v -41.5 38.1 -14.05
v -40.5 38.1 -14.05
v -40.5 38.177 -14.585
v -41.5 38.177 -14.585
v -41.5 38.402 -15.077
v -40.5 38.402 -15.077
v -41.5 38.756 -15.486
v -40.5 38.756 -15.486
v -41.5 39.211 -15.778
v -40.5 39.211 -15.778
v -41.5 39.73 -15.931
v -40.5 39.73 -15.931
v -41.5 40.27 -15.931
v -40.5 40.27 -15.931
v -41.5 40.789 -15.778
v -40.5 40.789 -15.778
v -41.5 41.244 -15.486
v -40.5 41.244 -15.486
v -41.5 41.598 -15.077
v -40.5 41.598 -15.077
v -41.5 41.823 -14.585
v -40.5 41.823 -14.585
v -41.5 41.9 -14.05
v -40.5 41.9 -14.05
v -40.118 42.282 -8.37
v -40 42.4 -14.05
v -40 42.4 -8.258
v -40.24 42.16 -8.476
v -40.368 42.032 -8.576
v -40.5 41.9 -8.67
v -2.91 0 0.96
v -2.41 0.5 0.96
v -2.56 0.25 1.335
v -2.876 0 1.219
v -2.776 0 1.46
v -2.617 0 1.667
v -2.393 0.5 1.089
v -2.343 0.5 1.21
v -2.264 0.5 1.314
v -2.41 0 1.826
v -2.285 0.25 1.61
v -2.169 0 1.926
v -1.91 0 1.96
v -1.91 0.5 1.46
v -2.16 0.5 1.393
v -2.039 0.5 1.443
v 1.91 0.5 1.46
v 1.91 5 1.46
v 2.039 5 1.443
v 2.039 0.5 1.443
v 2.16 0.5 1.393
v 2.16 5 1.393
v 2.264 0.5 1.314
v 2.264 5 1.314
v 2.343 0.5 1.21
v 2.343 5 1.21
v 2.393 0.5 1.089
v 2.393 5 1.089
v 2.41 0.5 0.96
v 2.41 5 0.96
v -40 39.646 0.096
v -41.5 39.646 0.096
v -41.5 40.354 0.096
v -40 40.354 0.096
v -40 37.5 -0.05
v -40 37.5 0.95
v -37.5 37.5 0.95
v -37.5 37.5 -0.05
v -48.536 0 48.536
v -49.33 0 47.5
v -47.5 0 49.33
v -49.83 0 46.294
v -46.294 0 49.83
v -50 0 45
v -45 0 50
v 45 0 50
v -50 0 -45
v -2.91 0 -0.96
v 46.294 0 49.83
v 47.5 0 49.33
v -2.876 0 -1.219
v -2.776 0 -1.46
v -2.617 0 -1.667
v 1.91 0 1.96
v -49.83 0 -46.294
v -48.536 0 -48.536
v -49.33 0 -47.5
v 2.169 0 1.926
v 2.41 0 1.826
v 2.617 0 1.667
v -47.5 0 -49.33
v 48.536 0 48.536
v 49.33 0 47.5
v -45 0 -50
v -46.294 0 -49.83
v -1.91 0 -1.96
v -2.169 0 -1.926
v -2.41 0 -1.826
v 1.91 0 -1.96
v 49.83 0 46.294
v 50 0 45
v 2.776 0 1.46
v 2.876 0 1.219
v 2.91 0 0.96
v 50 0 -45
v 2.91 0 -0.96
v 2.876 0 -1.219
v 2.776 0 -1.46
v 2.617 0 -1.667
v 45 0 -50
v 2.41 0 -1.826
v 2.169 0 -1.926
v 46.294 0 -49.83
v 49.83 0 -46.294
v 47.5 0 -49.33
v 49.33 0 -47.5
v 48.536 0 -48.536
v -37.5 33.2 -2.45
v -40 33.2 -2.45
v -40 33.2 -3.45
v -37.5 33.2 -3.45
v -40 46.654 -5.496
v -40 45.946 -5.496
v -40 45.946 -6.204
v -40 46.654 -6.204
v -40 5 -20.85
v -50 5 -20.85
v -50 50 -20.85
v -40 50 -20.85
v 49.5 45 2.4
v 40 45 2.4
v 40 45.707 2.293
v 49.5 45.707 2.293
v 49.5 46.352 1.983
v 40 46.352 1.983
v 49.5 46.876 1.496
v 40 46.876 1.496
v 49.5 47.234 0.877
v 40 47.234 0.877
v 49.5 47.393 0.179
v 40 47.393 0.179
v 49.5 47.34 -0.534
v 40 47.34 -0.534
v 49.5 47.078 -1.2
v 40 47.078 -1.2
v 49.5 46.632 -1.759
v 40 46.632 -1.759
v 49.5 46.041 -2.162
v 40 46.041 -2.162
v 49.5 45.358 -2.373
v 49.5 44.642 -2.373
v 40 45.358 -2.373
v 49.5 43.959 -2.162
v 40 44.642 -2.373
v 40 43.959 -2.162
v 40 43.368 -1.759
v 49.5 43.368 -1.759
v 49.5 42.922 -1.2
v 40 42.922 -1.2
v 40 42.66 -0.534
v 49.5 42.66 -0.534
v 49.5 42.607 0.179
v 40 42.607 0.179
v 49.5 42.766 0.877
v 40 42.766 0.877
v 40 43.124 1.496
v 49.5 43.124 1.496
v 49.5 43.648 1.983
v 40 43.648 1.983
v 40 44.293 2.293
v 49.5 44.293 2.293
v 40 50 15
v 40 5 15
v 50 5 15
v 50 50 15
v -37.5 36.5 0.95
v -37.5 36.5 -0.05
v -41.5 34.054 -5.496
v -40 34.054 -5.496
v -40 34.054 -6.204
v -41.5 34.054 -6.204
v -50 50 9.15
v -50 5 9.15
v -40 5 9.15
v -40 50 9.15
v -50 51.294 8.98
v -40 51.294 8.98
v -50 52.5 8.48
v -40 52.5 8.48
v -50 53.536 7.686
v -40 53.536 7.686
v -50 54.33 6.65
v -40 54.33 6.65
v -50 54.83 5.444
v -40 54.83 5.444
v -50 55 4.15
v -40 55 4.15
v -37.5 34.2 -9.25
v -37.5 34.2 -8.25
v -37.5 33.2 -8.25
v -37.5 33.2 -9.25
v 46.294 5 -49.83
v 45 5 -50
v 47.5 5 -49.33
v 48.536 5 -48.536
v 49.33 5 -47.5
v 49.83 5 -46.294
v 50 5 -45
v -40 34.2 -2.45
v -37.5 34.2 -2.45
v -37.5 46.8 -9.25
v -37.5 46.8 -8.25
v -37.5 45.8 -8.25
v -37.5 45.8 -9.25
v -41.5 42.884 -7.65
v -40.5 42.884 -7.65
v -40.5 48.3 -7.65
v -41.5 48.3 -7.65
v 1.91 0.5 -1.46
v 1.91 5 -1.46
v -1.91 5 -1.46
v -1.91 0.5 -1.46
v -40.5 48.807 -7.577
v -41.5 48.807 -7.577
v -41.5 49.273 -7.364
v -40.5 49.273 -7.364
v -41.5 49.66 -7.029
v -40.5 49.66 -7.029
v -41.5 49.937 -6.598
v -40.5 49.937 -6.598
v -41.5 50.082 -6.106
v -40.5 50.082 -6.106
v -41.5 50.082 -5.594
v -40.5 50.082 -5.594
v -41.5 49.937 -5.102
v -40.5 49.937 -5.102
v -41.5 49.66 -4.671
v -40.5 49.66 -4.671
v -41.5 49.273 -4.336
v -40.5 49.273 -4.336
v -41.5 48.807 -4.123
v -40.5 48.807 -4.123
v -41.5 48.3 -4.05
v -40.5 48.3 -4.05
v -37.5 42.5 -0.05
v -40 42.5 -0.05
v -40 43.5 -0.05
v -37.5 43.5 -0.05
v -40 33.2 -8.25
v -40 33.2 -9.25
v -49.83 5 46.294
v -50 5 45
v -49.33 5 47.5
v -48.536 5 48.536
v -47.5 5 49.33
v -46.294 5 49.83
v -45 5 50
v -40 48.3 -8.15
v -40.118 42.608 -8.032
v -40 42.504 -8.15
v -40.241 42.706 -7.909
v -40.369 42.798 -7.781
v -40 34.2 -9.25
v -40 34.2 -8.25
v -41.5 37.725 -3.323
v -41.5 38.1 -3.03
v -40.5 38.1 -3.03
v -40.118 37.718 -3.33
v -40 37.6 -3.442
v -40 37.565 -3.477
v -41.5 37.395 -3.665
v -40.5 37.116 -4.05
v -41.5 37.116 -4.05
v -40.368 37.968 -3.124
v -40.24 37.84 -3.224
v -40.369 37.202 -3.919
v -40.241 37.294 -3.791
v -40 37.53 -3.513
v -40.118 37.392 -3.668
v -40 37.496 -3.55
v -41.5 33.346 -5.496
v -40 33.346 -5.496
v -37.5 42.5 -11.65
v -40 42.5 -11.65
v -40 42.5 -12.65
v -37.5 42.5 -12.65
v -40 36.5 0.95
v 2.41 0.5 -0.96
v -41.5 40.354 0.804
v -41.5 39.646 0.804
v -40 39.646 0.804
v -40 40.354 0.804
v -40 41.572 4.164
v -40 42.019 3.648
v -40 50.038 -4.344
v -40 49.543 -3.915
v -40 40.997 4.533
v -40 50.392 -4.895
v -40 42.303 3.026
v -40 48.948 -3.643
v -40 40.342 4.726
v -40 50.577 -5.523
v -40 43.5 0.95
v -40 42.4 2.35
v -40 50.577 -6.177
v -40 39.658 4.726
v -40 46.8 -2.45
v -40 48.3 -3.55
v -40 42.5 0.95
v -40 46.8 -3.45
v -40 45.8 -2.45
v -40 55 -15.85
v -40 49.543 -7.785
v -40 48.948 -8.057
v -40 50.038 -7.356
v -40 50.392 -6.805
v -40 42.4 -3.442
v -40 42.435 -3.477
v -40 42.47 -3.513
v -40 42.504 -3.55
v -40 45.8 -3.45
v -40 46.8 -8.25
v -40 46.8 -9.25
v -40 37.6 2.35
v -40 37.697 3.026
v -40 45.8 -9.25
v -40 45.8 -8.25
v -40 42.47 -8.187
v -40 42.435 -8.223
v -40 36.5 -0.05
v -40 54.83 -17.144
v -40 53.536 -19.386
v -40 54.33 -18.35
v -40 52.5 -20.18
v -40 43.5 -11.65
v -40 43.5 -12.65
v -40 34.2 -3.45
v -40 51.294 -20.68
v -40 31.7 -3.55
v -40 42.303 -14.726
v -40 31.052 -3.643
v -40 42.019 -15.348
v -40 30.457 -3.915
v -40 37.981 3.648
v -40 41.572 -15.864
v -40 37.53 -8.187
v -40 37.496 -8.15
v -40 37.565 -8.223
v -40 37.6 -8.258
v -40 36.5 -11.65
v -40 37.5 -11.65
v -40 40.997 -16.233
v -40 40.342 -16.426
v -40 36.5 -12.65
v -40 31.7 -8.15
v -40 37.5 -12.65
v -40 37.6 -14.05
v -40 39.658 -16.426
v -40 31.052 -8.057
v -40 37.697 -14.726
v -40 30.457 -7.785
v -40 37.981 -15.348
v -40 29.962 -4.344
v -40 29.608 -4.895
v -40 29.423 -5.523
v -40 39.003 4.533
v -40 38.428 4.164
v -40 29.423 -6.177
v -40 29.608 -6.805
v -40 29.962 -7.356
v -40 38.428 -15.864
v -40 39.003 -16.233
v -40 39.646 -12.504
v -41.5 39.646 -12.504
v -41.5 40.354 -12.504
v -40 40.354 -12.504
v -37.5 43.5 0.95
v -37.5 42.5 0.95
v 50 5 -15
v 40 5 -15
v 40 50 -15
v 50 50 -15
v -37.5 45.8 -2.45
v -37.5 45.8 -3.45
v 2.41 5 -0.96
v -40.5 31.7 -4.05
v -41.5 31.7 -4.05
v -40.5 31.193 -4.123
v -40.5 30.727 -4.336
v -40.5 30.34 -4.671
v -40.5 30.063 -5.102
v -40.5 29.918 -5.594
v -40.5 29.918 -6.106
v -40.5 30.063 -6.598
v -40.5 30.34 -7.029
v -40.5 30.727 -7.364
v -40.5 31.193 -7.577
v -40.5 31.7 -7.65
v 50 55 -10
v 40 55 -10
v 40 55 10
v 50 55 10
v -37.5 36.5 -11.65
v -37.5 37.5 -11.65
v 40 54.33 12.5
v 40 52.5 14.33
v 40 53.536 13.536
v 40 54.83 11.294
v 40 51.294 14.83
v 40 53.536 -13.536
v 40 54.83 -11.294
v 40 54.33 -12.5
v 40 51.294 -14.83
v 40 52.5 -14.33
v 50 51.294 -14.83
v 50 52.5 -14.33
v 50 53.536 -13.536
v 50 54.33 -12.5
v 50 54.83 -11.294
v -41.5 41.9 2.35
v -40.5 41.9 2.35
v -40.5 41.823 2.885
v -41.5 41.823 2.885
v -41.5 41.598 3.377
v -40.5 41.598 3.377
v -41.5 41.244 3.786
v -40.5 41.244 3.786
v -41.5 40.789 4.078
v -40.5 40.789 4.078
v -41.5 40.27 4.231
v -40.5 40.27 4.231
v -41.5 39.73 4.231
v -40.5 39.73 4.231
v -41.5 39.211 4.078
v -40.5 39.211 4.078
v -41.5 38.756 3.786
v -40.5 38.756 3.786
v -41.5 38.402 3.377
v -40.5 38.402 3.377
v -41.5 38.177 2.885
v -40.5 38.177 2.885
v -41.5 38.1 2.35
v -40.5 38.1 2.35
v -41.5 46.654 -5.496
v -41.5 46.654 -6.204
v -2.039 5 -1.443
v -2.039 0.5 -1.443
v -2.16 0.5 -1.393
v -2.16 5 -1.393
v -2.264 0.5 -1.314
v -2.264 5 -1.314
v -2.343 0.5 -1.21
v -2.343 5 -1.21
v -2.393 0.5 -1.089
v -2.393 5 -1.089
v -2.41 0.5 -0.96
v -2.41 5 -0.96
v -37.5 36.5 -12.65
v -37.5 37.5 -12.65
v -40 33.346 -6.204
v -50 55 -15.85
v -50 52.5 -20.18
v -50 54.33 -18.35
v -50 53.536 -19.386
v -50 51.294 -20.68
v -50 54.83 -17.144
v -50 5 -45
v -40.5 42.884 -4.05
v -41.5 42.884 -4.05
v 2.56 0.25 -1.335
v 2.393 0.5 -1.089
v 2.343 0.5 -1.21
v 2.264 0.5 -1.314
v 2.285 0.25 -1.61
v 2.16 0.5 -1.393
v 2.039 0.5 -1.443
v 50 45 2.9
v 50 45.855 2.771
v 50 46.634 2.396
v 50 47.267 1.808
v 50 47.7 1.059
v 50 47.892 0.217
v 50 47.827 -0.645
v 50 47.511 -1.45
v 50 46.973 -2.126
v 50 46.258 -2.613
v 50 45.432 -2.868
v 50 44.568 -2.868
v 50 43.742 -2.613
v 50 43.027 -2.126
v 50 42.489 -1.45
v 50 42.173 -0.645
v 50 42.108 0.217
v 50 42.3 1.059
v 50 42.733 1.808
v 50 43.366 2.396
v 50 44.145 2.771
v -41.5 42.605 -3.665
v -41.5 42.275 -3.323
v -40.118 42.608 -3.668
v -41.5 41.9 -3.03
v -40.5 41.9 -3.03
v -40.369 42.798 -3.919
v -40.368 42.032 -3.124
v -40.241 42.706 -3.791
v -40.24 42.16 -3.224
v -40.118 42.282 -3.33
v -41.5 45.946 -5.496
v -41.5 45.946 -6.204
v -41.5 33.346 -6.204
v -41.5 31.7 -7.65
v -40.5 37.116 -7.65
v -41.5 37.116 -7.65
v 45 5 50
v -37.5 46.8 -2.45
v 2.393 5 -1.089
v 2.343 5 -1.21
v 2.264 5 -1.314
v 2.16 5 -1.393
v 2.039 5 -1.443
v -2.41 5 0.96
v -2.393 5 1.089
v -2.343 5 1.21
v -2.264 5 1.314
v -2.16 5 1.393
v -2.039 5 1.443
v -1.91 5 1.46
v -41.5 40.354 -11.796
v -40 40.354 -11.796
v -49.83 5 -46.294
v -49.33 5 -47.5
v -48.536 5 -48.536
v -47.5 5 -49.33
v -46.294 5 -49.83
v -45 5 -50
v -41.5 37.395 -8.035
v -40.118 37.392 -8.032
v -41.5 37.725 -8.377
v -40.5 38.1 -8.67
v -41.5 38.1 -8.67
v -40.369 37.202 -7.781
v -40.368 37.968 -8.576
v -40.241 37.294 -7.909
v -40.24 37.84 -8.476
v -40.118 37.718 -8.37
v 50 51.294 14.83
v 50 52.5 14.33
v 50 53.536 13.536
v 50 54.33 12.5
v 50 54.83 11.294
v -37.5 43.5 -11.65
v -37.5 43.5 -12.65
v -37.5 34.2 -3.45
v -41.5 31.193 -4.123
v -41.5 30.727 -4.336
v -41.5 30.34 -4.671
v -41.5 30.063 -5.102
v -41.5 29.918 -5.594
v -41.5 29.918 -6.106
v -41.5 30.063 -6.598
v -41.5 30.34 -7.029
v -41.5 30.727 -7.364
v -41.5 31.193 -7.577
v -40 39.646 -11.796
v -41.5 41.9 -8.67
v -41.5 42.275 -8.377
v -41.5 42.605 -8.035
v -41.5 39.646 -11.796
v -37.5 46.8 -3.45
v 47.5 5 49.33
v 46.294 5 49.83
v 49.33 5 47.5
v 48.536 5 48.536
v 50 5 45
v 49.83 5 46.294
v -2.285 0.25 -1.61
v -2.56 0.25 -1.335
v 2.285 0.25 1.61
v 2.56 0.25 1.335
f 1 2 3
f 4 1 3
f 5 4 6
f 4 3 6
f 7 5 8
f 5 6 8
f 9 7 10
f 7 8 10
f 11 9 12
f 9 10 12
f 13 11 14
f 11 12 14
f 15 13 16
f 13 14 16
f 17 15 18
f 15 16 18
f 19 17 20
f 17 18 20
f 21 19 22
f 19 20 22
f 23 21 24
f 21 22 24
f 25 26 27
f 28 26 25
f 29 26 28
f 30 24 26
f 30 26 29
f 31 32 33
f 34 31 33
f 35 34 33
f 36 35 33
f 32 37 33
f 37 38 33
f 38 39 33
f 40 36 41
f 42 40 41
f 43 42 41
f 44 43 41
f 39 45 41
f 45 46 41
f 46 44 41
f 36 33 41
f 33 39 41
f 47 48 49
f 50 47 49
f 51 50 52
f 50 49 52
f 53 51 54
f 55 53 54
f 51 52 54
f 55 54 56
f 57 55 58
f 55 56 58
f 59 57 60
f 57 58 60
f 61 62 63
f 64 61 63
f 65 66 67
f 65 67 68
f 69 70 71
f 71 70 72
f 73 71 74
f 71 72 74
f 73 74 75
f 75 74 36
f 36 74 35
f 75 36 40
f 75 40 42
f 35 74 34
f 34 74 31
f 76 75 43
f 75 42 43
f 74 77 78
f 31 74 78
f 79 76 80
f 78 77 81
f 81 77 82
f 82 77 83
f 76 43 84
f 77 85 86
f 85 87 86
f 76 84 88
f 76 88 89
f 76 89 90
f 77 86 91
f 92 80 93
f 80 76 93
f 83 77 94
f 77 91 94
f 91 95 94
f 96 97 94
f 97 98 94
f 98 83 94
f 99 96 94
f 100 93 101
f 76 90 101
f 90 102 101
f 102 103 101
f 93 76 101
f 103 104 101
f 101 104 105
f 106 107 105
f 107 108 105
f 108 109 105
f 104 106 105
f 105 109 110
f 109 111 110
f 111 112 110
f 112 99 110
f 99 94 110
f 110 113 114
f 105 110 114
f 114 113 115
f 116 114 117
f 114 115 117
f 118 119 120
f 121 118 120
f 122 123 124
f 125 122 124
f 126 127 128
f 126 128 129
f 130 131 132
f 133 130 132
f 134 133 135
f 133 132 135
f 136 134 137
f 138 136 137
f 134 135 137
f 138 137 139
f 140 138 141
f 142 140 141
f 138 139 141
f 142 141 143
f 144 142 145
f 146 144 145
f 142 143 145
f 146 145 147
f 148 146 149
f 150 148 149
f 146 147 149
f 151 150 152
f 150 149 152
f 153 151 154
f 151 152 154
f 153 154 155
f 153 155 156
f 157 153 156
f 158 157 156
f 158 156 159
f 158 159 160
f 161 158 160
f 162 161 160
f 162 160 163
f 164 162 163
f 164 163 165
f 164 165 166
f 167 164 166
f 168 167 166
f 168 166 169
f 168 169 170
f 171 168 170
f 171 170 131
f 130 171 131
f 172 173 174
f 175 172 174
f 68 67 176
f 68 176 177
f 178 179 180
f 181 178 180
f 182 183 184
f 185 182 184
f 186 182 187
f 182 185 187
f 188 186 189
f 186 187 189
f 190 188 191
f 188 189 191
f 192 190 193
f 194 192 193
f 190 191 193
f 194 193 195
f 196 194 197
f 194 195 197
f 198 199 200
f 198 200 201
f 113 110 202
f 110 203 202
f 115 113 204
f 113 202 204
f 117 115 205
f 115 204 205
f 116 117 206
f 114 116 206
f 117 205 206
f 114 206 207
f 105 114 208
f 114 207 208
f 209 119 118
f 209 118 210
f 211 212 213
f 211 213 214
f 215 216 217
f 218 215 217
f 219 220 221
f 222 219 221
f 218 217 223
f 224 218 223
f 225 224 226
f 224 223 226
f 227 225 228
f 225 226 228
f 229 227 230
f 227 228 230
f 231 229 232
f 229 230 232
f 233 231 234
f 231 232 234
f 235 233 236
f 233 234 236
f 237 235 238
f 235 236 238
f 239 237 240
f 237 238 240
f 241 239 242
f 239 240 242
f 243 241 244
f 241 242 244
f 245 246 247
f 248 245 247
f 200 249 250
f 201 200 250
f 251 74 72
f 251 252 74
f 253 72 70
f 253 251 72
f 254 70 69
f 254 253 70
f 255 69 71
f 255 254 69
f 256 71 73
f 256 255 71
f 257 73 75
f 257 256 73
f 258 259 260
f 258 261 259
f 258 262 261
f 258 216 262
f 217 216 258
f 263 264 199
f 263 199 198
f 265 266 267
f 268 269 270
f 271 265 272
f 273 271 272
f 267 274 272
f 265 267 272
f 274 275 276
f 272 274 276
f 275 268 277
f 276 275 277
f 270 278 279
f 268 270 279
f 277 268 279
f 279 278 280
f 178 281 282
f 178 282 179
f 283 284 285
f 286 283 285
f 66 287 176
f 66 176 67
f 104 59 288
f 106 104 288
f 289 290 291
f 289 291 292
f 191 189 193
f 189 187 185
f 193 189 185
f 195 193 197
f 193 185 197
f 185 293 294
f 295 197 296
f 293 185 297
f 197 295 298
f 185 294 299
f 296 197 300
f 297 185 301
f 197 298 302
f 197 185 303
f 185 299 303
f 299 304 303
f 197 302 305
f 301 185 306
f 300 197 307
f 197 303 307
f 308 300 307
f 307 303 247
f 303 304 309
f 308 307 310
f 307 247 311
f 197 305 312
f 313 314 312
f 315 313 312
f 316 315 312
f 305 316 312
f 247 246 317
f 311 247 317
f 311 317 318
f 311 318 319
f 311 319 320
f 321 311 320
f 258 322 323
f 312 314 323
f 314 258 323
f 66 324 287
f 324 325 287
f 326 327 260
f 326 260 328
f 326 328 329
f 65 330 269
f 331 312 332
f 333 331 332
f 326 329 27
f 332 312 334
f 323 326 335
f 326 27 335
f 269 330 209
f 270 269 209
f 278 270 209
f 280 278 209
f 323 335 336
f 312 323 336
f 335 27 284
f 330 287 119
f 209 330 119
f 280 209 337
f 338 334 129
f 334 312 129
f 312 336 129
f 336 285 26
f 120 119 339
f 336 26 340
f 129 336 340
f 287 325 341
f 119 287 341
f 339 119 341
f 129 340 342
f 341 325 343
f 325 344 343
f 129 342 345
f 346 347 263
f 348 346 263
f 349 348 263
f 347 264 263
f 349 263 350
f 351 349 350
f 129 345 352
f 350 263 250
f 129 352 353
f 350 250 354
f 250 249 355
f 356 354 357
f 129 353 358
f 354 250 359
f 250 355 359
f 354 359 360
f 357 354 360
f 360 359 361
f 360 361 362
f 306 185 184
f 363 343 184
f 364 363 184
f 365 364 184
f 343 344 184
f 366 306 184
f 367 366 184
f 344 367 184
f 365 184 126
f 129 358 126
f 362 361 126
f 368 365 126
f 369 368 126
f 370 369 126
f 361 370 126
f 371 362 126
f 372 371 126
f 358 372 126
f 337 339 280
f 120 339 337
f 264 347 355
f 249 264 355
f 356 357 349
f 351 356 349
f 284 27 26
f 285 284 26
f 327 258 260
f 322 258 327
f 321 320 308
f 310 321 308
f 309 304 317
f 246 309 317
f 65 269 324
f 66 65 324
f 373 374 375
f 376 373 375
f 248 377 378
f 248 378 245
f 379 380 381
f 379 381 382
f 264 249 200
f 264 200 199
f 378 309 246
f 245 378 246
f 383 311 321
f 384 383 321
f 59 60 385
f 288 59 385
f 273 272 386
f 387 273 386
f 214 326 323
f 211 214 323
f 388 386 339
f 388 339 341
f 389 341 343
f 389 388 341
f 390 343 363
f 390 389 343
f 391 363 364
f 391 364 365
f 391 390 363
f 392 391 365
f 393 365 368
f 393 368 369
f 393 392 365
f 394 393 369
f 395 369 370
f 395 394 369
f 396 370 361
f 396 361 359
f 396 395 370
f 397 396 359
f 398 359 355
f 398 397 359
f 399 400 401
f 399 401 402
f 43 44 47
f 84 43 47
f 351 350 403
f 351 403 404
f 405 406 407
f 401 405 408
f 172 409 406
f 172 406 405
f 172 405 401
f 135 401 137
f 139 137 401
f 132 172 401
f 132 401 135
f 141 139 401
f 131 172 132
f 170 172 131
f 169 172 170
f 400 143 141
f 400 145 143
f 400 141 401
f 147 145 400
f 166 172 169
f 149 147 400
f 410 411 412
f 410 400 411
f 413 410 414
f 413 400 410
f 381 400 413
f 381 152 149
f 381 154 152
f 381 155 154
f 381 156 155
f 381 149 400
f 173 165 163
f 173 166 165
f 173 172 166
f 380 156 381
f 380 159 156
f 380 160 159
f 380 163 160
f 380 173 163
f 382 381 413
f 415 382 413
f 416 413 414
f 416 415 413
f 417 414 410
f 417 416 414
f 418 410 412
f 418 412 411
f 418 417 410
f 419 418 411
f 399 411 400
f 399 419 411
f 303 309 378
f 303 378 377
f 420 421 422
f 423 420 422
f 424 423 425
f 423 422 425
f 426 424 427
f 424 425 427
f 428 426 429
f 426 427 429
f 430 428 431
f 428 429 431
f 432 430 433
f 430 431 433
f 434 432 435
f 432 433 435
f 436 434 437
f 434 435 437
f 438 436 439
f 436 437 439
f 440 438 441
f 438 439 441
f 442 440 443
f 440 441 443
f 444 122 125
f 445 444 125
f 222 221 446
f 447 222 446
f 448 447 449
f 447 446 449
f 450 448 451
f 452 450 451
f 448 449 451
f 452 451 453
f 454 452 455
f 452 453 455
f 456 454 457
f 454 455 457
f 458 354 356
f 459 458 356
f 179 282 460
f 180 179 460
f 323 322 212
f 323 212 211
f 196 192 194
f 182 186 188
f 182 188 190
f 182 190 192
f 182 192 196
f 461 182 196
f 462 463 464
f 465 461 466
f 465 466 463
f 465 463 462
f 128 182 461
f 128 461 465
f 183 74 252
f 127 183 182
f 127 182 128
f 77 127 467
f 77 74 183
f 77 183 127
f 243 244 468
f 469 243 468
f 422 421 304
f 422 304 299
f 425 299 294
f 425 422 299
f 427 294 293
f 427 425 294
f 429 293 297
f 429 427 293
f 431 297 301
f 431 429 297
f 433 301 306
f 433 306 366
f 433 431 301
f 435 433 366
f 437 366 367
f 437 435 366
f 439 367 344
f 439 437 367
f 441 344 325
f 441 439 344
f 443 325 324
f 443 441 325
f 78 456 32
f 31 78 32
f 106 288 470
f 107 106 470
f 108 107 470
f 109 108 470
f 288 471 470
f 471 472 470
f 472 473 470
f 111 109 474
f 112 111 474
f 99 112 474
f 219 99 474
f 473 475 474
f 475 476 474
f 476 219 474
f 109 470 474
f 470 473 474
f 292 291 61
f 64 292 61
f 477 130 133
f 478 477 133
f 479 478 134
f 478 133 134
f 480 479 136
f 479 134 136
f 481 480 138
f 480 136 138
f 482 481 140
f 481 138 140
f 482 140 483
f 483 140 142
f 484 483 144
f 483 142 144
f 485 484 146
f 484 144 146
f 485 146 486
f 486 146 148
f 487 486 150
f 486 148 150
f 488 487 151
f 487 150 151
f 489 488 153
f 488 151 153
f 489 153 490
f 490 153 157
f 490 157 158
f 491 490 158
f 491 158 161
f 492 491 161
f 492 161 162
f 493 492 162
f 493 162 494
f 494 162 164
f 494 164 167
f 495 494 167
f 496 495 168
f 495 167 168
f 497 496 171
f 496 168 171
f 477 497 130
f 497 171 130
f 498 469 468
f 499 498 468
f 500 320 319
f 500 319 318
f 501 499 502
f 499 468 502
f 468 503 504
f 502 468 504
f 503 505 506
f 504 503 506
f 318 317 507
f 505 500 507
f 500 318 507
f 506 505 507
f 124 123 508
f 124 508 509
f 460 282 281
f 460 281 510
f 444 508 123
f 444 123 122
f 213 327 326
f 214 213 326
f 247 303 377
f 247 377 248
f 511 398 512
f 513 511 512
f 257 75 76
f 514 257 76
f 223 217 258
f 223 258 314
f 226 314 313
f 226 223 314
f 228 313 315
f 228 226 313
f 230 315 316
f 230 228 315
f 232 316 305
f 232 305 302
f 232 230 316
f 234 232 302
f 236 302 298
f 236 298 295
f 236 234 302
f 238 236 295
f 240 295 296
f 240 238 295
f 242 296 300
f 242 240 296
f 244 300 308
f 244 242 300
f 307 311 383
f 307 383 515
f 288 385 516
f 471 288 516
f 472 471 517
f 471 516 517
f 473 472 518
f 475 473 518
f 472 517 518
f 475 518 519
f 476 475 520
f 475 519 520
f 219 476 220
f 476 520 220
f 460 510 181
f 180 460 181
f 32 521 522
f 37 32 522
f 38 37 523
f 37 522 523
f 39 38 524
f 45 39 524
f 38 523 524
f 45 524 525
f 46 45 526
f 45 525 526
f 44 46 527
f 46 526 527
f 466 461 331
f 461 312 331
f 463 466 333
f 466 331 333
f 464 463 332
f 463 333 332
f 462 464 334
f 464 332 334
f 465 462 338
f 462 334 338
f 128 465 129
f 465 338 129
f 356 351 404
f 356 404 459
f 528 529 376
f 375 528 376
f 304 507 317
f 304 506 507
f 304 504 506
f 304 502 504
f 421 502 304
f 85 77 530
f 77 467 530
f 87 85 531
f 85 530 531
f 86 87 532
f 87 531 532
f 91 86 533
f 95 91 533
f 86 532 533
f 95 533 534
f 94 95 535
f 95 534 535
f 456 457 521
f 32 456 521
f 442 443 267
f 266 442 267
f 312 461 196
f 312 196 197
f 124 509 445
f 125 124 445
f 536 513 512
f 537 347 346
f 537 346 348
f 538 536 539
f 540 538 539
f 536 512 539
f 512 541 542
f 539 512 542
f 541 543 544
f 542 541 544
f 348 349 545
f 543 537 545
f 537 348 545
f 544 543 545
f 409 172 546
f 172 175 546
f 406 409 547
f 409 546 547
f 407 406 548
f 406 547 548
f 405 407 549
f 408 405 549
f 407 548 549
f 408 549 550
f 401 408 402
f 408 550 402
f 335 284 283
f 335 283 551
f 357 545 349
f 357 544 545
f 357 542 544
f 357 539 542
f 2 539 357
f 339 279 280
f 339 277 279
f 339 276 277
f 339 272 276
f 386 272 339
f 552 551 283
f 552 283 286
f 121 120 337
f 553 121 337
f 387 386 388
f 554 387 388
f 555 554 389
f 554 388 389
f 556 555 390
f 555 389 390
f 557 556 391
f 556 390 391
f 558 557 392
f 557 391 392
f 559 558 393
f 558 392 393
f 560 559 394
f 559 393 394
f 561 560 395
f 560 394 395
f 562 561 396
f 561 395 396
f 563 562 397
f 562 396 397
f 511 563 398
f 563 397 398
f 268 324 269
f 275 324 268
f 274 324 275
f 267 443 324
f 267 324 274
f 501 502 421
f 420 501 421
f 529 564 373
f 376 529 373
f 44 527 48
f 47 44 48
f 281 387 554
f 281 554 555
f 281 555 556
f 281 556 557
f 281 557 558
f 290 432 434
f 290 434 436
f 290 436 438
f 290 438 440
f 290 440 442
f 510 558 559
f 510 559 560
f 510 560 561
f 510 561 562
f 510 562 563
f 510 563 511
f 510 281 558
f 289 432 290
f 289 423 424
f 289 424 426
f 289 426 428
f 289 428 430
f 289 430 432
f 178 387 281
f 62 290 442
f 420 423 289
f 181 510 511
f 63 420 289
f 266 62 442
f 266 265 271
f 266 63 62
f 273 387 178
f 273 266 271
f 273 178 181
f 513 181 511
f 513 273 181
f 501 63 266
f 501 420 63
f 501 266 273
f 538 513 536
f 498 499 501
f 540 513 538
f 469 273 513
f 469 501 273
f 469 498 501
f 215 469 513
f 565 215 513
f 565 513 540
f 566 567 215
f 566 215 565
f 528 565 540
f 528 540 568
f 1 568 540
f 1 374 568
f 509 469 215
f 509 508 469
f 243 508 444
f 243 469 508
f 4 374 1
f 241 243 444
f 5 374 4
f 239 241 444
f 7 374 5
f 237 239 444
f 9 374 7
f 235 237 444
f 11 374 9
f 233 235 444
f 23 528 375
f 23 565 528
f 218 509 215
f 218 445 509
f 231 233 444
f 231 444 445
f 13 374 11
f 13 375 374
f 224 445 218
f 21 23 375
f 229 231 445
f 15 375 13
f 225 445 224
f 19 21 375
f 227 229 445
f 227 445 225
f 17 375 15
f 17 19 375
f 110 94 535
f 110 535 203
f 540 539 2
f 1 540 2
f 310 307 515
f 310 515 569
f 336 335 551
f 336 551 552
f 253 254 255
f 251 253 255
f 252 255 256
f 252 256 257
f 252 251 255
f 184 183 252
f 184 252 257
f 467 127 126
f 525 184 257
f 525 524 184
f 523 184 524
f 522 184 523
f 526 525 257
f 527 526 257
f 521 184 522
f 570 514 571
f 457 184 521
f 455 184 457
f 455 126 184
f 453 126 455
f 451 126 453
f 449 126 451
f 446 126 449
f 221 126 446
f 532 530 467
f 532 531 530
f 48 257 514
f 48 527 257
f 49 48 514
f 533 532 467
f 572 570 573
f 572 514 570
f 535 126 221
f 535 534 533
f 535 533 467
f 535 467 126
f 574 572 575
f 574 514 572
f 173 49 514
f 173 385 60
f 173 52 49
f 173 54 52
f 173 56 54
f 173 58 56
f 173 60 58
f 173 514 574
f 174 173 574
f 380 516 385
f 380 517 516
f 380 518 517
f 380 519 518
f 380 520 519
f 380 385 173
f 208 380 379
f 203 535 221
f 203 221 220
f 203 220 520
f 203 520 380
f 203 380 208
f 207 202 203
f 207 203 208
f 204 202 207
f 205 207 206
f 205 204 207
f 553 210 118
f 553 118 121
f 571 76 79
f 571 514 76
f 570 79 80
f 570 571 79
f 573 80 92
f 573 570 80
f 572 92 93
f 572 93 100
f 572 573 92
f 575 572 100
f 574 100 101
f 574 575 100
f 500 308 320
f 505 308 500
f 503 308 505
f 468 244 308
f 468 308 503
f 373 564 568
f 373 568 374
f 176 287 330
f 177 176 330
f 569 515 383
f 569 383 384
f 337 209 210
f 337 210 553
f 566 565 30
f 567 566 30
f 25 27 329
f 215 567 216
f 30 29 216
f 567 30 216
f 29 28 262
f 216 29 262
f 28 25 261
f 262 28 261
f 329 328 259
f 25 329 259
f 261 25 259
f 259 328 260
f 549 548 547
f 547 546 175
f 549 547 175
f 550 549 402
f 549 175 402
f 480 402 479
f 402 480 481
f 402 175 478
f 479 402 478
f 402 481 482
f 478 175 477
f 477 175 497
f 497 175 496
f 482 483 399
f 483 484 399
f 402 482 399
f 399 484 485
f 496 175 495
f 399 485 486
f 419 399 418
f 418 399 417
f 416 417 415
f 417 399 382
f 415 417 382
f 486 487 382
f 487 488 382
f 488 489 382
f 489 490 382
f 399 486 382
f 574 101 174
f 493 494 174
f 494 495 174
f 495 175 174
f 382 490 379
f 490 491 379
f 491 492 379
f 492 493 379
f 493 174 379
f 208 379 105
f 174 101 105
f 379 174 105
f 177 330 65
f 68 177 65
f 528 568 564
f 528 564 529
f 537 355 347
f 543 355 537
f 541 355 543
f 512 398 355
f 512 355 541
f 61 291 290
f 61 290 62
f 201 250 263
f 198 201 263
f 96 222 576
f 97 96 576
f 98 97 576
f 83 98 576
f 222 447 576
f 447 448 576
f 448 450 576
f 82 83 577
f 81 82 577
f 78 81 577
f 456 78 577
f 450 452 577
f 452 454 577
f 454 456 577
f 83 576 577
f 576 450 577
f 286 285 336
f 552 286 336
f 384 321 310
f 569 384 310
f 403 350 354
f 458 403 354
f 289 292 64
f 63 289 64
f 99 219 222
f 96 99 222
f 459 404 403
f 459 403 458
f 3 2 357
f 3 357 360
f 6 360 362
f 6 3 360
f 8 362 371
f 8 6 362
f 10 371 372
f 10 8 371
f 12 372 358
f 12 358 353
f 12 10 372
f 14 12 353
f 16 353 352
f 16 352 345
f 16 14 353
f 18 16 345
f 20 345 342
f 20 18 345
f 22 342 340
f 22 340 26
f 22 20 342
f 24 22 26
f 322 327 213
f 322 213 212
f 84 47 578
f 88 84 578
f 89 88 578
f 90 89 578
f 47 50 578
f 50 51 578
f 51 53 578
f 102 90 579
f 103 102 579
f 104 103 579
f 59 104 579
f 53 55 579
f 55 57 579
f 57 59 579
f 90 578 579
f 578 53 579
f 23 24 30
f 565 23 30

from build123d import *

# Parameters (mm, degrees)
SKETCH1_W           = 100
SKETCH1_H           = 100
BOSS_EXTRUDE1_DEPTH = 5
SKETCH2_W           = 10
SKETCH2_H           = 30
BOSS_EXTRUDE2_DEPTH = 50
CUT_EXTRUDE2_DEPTH  = 6
FILLET1_R           = 5
FILLET2_R           = 5
SKETCH7_W           = 0.707106782
SKETCH7_H           = 0.707106782
CUT_EXTRUDE3_DEPTH  = 1.5
SKETCH10_R          = 2.4
CUT_EXTRUDE4_DEPTH  = 11
CHAMFER1_SIZE       = 0.5
CHAMFER2_SIZE       = 0.5
CHAMFER3_SIZE       = 0.5
SKETCH11_W          = 1
SKETCH11_H          = 1
BOSS_EXTRUDE3_DEPTH = 2.5


with BuildPart() as part:
    # Sketch1 → Boss-Extrude1 (new body)
    with BuildSketch(Plane(origin=(0, 0, 0), x_dir=(1, 0, 0), z_dir=(0, 1, 0))):
        Rectangle(SKETCH1_W, SKETCH1_H)
    extrude(amount=BOSS_EXTRUDE1_DEPTH)

    # Sketch2 → Boss-Extrude2 (add)
    with BuildSketch(Plane(origin=(0, 5, 0), x_dir=(1, 0, 0), z_dir=(0, 1, 0))):
        with Locations((-45, 5.85)):
            Rectangle(SKETCH2_W, SKETCH2_H)
        with Locations((45, 0)):
            Rectangle(SKETCH2_W, SKETCH2_H)
    extrude(amount=BOSS_EXTRUDE2_DEPTH)

    # Sketch4 → Cut-Extrude2 (cut, through all)
    with BuildSketch(Plane(origin=(0, 5, 0), x_dir=(1, 0, 0), z_dir=(0, 1, 0))):
        with BuildLine():
            Line((-1.91, -1.46), (1.91, -1.46))
            ThreePointArc((1.91, -1.46), (2.263553391, -1.313553391), (2.41, -0.96))
            Line((2.41, -0.96), (2.41, 0.96))
            ThreePointArc((2.41, 0.96), (2.263553391, 1.313553391), (1.91, 1.46))
            Line((1.91, 1.46), (-1.91, 1.46))
            ThreePointArc((-1.91, 1.46), (-2.263553391, 1.313553391), (-2.41, 0.96))
            Line((-2.41, 0.96), (-2.41, -0.96))
            ThreePointArc((-2.41, -0.96), (-2.263553391, -1.313553391), (-1.91, -1.46))
        make_face()
    extrude(amount=-CUT_EXTRUDE2_DEPTH, mode=Mode.SUBTRACT)

    # Fillet1
    fillet1_edges = [part.edges().sort_by_distance(p)[0] for p in [
        (50, 2.5, 50),
        (-50, 2.5, 50),
        (-50, 2.5, -50),
        (50, 2.5, -50),
    ]]
    fillet(fillet1_edges, radius=FILLET1_R)

    # Fillet2
    fillet2_edges = [part.edges().sort_by_distance(p)[0] for p in [
        (-45, 55, 9.15),
        (-45, 55, -20.85),
        (45, 55, -15),
        (45, 55, 15),
    ]]
    fillet(fillet2_edges, radius=FILLET2_R)

    # Sketch7 → Cut-Extrude3 (cut)
    with BuildSketch(Plane(origin=(-40, 0, 0), x_dir=(0, 0, -1), z_dir=(1, 0, 0))):
        with BuildLine():
            Line((7.65, 31.7), (7.65, 37.11555898))
            ThreePointArc((7.65, 37.11555898), (8.211651546, 37.554064192), (8.669574436, 38.1))
            Line((8.669574436, 38.1), (14.05, 38.1))
            ThreePointArc((14.05, 38.1), (15.95, 40), (14.05, 41.9))
            Line((14.05, 41.9), (8.669574436, 41.9))
            ThreePointArc((8.669574436, 41.9), (8.211651546, 42.445935808), (7.65, 42.88444102))
            Line((7.65, 42.88444102), (7.65, 48.3))
            ThreePointArc((7.65, 48.3), (5.85, 50.1), (4.05, 48.3))
            Line((4.05, 48.3), (4.05, 42.88444102))
            ThreePointArc((4.05, 42.88444102), (3.488348454, 42.445935808), (3.030425564, 41.9))
            Line((3.030425564, 41.9), (-2.35, 41.9))
            ThreePointArc((-2.35, 41.9), (-4.25, 40), (-2.35, 38.1))
            Line((-2.35, 38.1), (3.030425564, 38.1))
            ThreePointArc((3.030425564, 38.1), (3.488348454, 37.554064192), (4.05, 37.11555898))
            Line((4.05, 37.11555898), (4.05, 31.7))
            ThreePointArc((4.05, 31.7), (5.85, 29.9), (7.65, 31.7))
        make_face()
        with Locations((-0.45, 40)):
            Rectangle(SKETCH7_W, SKETCH7_H, mode=Mode.SUBTRACT)
        with Locations((5.85, 33.7)):
            Rectangle(SKETCH7_W, SKETCH7_H, mode=Mode.SUBTRACT)
        with Locations((12.15, 40)):
            Rectangle(SKETCH7_W, SKETCH7_H, mode=Mode.SUBTRACT)
        with Locations((5.85, 46.3)):
            Rectangle(SKETCH7_W, SKETCH7_H, mode=Mode.SUBTRACT)
    extrude(amount=-CUT_EXTRUDE3_DEPTH, mode=Mode.SUBTRACT)

    # Sketch10 → Cut-Extrude4 (cut, through all)
    with BuildSketch(Plane.ZY.offset(-40)):
        with Locations((0, 45)):
            Circle(SKETCH10_R)
    extrude(amount=-CUT_EXTRUDE4_DEPTH, mode=Mode.SUBTRACT)

    # Chamfer1
    chamfer1_edges = [part.edges().sort_by_distance(p)[0] for p in [
        (2.263553391, 0, 1.313553391),
        (0, 0, 1.46),
        (-2.263553391, 0, 1.313553391),
        (-2.41, 0, 0),
        (-2.263553391, 0, -1.313553391),
        (0, 0, -1.46),
        (2.263553391, 0, -1.313553391),
        (2.41, 0, 0),
    ]]
    chamfer(chamfer1_edges, length=CHAMFER1_SIZE)

    # Chamfer2
    chamfer2_edges = [part.edges().sort_by_distance(p)[0] for p in [
        (-40, 45.59222051, -4.05),
        (-40, 41.9, -11.359787218),
        (-40, 34.40777949, -4.05),
        (-40, 41.9, -0.340212782),
        (-40, 40, 4.25),
        (-40, 38.1, -0.340212782),
        (-40, 29.9, -5.85),
        (-40, 34.40777949, -7.65),
        (-40, 38.1, -11.359787218),
        (-40, 40, -15.95),
        (-40, 45.59222051, -7.65),
        (-40, 50.1, -5.85),
    ]]
    chamfer(chamfer2_edges, length=CHAMFER2_SIZE)

    # Chamfer3
    chamfer3_edges = [part.edges().sort_by_distance(p)[0] for p in [
        (50, 45, -2.4),
    ]]
    chamfer(chamfer3_edges, length=CHAMFER3_SIZE)

    # Sketch11 → Boss-Extrude3 (add)
    with BuildSketch(Plane(origin=(-40, 0, 0), x_dir=(0, 0, -1), z_dir=(1, 0, 0))):
        with Locations((2.95, 46.3)):
            Rectangle(SKETCH11_W, SKETCH11_H)
        with Locations((8.75, 46.3)):
            Rectangle(SKETCH11_W, SKETCH11_H)
        with Locations((12.15, 43)):
            Rectangle(SKETCH11_W, SKETCH11_H)
        with Locations((12.15, 37)):
            Rectangle(SKETCH11_W, SKETCH11_H)
        with Locations((8.75, 33.7)):
            Rectangle(SKETCH11_W, SKETCH11_H)
        with Locations((2.95, 33.7)):
            Rectangle(SKETCH11_W, SKETCH11_H)
        with Locations((-0.45, 37)):
            Rectangle(SKETCH11_W, SKETCH11_H)
        with Locations((-0.45, 43)):
            Rectangle(SKETCH11_W, SKETCH11_H)
    extrude(amount=BOSS_EXTRUDE3_DEPTH)


solid = part.part
